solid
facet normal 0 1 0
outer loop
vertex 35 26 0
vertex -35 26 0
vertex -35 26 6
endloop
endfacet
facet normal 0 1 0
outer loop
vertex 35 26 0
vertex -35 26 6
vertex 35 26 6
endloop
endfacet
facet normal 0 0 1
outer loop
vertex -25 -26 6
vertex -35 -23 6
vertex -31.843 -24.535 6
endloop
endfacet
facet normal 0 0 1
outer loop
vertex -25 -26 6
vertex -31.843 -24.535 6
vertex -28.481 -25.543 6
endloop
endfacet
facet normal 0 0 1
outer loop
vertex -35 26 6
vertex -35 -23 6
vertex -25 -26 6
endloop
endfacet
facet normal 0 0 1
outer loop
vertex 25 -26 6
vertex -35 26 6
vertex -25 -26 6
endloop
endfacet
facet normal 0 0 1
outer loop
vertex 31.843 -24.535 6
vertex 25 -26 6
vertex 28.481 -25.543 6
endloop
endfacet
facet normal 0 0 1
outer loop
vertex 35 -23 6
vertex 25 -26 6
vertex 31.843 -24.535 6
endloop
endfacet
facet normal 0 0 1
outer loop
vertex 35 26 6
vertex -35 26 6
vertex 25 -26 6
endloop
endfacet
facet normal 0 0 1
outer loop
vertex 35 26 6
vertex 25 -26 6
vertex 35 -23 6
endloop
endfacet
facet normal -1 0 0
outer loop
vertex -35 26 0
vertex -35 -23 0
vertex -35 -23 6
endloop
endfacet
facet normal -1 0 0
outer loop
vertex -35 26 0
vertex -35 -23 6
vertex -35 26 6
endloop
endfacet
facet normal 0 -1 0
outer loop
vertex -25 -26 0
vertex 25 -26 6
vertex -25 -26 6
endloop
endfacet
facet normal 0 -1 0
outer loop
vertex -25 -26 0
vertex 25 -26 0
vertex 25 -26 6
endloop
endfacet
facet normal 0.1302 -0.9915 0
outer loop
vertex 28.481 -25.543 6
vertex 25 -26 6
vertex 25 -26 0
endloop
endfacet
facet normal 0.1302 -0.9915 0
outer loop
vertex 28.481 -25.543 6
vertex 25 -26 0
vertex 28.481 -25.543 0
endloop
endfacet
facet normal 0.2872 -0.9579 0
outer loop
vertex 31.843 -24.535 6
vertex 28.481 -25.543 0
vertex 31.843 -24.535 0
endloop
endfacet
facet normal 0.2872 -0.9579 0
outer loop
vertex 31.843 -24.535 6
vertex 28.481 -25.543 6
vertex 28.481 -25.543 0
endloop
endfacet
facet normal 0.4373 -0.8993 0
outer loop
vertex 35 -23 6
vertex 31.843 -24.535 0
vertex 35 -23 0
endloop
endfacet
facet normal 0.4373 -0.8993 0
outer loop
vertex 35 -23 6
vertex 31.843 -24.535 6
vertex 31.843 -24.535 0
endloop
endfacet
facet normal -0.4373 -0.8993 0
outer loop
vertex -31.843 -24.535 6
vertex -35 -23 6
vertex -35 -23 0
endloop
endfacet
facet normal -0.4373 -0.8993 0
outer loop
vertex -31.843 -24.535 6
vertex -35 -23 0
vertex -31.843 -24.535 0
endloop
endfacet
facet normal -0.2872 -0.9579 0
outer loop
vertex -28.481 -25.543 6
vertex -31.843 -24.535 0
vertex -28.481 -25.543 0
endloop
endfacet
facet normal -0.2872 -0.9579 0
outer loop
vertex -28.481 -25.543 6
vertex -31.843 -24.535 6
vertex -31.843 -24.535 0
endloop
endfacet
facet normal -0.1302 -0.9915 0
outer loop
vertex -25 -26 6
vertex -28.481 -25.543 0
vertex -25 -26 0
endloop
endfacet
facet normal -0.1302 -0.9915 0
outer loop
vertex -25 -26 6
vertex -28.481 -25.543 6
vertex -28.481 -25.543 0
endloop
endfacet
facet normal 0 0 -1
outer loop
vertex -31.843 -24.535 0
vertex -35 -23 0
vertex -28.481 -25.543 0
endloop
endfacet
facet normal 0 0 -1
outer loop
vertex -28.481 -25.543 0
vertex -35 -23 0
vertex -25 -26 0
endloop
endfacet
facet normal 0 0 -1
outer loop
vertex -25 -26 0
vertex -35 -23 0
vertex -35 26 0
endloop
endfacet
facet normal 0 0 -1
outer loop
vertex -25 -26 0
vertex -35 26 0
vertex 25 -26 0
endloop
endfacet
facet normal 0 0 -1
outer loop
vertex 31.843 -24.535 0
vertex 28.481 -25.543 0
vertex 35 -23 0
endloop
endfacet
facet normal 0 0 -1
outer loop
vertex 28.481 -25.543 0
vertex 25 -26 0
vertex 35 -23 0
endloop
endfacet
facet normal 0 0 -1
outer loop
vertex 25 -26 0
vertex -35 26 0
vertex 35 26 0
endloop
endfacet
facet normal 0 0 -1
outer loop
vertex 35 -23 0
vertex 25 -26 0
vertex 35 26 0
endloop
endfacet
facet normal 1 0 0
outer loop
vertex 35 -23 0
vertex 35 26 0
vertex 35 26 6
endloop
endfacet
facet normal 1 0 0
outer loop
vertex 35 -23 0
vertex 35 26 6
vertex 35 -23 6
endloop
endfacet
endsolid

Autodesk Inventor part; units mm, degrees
ref_plane "YZ Plane" through (0, 0, 0) normal (1, 0, 0) x (0, 1, 0)
ref_plane "XZ Plane" through (0, 0, 0) normal (0, 1, 0) x (-1, 0, 0)
ref_plane "XY Plane" through (0, 0, 0) normal (0, 0, 1) x (1, 0, 0)
sketch "草图1" plane through (0, 0, 0) normal (0, 0, 1) x (1, 0, 0)
  line L0 (35, -26) -> (-35, -26)
  line L1 (-35, -26) -> (-35, 26)
  line L2 (-35, 26) -> (35, 26)
  line L3 (35, 26) -> (35, -26)
  line L4 (35, -26) -> (-35, 26) construction
  line L5 (-35, -26) -> (35, 26) construction
  point P0 (0, 0)
  dimension "d0" = 70
  dimension "d1" = 52
extrude "拉伸1" add sketch "草图1" along normal blind 6
sketch "草图2" plane through (0, 0, 6) normal (0, 0, 1) x (1, 0, 0)
  line L0 (35, 26) -> (-35, 26) projected
  line L1 (-35, 26) -> (-35, -26) projected
  line L2 (-35, -26) -> (35, -26) projected
  line L3 (35, -26) -> (35, 26) projected
  arc A0 (-35, -23) -> (-25, -26) centre (-23.9099, -4.1996) ccw
  point P0 (0, 0)
  dimension "d4" = 3
  dimension "d5" = 10
extrude "拉伸2" cut sketch "草图2" against normal blind 6 contours A0 L2 L1
mirror "镜像1" about plane through (0, 0, 0) normal (1, 0, 0) of "拉伸2"
ref_plane "工作平面1" through (0, 0, 0) normal (1, 0, 0) x (0, 1, 0)
properties part number "键盘"
